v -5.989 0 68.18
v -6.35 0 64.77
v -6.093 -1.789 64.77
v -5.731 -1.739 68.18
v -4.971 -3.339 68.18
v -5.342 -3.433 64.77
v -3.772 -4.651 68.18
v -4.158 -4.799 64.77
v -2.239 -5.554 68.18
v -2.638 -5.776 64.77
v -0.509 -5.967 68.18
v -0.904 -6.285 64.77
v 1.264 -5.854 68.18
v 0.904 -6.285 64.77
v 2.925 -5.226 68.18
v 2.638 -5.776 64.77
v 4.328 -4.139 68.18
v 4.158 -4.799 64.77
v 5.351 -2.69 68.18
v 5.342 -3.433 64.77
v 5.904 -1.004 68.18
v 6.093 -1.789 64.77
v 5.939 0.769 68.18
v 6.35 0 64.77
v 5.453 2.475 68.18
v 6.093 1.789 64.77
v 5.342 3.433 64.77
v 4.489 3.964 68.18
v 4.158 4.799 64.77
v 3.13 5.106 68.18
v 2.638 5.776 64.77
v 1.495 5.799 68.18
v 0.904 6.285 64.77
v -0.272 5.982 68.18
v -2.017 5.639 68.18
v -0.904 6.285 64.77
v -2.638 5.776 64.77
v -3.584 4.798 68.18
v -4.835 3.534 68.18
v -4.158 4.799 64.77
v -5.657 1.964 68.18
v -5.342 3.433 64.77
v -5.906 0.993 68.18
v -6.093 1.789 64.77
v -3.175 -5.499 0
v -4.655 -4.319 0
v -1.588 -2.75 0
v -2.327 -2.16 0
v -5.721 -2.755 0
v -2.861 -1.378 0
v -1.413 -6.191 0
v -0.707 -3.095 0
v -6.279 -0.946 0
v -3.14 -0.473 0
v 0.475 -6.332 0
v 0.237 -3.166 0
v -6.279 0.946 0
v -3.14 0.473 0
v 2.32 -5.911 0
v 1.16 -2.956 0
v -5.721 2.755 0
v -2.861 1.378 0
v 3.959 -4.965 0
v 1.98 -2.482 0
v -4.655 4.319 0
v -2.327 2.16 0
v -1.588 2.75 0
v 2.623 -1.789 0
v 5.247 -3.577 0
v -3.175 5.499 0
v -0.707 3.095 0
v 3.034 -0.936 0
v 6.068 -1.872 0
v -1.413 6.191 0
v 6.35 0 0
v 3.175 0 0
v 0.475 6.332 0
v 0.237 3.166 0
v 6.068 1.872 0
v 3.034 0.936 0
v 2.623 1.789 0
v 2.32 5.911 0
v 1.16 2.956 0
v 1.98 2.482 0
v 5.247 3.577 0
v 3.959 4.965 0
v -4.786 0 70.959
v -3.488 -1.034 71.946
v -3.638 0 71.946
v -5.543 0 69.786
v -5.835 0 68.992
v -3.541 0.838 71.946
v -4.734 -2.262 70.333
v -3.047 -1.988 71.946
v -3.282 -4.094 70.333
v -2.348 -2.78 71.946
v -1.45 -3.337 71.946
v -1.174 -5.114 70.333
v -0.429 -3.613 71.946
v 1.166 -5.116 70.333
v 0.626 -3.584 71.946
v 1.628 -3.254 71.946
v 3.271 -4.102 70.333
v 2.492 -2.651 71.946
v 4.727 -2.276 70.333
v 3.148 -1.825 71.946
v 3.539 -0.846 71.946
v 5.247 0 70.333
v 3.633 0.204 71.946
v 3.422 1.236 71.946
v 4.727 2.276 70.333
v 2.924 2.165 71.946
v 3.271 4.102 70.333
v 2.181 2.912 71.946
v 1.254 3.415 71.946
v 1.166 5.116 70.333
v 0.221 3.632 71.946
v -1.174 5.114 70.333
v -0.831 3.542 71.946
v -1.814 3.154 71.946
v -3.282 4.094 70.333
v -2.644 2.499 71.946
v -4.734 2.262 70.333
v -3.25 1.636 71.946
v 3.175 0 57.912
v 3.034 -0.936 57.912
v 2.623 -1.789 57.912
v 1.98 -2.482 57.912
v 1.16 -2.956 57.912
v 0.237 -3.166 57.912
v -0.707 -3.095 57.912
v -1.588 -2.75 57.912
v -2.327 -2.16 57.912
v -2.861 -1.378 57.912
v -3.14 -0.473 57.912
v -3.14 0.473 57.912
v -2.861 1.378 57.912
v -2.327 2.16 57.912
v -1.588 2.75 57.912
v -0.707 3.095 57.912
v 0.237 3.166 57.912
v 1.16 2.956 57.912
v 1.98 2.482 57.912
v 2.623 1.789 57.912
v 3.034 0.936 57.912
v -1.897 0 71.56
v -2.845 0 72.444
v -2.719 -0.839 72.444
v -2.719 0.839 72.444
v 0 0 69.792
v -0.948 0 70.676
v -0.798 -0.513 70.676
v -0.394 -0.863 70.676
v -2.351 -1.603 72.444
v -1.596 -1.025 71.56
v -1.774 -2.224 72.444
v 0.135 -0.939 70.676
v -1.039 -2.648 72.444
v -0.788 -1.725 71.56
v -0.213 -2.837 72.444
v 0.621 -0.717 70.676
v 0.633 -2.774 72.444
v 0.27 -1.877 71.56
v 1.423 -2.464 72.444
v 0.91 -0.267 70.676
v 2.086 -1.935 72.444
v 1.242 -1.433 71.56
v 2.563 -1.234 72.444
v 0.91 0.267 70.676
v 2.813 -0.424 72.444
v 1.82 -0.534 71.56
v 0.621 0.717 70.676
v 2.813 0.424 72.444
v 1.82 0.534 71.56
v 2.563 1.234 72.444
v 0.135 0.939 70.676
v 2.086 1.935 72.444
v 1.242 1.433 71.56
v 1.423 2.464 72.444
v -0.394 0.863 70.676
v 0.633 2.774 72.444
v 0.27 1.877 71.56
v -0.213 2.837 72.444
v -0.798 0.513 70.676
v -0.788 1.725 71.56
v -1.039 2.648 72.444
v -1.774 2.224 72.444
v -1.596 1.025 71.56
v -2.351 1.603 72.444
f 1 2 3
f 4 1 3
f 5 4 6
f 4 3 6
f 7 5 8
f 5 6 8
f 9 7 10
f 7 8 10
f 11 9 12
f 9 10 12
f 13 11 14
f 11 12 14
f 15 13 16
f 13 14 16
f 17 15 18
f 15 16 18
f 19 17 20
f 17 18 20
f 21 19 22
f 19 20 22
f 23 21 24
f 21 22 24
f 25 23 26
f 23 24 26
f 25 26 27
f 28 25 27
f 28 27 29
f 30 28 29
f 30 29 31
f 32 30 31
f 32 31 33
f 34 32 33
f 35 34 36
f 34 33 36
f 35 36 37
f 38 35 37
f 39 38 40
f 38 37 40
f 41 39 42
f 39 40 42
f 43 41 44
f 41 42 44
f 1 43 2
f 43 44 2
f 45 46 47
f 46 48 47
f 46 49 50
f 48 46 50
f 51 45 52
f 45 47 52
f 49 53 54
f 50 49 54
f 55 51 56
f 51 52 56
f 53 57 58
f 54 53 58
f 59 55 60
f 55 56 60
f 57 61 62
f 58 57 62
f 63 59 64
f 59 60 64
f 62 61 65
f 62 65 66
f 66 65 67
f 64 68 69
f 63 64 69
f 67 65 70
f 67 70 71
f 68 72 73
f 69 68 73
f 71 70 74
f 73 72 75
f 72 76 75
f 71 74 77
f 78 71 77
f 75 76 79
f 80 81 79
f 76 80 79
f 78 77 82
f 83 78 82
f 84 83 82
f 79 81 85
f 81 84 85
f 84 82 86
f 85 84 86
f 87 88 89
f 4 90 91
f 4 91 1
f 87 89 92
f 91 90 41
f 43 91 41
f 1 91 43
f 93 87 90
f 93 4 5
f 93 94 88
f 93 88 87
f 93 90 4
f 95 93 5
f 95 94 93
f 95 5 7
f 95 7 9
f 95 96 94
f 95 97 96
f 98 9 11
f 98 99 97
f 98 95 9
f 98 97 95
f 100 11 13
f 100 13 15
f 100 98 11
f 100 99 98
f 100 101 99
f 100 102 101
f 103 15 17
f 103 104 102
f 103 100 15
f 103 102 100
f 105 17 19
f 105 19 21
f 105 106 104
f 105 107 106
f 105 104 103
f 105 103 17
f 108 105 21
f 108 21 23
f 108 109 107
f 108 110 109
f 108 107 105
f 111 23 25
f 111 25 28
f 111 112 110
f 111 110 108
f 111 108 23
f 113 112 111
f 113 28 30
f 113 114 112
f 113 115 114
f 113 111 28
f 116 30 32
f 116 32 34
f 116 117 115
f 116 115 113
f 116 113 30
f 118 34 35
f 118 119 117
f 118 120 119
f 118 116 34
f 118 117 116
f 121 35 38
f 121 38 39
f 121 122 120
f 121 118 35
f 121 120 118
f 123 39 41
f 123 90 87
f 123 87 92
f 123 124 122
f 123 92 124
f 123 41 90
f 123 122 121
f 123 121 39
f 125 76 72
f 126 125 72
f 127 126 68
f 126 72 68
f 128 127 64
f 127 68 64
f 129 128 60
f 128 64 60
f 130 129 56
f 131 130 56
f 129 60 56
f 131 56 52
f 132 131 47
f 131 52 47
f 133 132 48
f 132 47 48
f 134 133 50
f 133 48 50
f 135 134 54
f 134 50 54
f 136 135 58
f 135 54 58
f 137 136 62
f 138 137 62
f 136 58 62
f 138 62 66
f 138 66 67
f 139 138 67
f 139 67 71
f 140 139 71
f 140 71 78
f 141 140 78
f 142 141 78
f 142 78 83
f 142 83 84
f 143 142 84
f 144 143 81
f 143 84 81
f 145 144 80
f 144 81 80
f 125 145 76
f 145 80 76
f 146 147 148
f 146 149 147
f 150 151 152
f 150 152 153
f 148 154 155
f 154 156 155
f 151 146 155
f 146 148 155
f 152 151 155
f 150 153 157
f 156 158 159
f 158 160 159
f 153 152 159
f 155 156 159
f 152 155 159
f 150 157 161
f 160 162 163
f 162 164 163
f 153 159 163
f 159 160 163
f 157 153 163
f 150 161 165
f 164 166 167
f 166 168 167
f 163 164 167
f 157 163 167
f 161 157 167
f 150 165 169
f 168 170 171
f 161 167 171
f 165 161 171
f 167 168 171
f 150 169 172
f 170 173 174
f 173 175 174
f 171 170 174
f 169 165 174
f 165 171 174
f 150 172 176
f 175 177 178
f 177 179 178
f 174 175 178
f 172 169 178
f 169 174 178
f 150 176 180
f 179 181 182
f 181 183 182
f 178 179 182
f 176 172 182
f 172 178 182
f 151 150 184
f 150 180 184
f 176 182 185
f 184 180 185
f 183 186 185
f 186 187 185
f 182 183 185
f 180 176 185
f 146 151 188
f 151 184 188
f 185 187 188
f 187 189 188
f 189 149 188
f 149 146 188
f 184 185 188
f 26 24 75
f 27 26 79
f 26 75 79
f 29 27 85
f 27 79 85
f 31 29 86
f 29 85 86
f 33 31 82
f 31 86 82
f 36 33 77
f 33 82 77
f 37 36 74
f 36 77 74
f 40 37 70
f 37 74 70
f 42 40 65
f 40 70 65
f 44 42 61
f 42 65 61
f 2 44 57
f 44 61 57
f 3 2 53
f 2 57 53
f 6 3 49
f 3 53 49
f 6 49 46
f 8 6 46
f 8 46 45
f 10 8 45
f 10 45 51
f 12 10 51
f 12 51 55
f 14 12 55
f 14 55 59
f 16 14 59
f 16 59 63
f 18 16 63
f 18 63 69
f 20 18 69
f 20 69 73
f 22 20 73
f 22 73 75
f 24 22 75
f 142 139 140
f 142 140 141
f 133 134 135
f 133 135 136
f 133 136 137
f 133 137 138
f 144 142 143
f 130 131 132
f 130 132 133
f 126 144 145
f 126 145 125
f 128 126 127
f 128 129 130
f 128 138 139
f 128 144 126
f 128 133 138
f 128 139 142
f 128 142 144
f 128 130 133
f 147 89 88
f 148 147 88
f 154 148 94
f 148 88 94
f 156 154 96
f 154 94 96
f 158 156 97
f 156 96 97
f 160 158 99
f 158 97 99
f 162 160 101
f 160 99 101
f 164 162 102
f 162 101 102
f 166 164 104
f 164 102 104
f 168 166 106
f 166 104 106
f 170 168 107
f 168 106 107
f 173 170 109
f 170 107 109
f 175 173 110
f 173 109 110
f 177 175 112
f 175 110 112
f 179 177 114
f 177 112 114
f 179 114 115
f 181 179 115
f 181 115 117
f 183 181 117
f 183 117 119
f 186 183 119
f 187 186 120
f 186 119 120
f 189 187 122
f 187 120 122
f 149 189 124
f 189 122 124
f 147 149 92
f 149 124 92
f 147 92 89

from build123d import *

# Parameters (mm, degrees)
F0_R     = 6.35
F1_DEPTH = 64.77
F5_R     = 3.175
F6_DEPTH = 57.912
F7_R     = 5.08


with BuildPart() as f1:
    # F0 (on Top) → F1 (new body)
    with BuildSketch(Plane.XY):
        Circle(F0_R)
    extrude(amount=F1_DEPTH)

    # F3 (on Front) → F4 (revolve)
    with BuildSketch(Plane.XZ):
        Polygon((0, 64.77), (0, 69.791943), (-2.845018, 72.444359), (-5.728471, 70.633823), (-6.35, 64.77), align=None)
    revolve(axis=Axis((0, 0, 36.195), (0, 0, 1)))

    # F5 (on face) → F6 (cut)
    with BuildSketch(Plane(origin=(0, 0, 0), x_dir=(1, 0, 0), z_dir=(0, 0, -1))):
        Circle(F5_R)
    extrude(amount=-F6_DEPTH, mode=Mode.SUBTRACT)

    # F7
    f7_edges = [f1.edges().sort_by_distance(p)[0] for p in [
        (5.728471, 0, 70.633823),
    ]]
    fillet(f7_edges, radius=F7_R)


solid = f1.part
